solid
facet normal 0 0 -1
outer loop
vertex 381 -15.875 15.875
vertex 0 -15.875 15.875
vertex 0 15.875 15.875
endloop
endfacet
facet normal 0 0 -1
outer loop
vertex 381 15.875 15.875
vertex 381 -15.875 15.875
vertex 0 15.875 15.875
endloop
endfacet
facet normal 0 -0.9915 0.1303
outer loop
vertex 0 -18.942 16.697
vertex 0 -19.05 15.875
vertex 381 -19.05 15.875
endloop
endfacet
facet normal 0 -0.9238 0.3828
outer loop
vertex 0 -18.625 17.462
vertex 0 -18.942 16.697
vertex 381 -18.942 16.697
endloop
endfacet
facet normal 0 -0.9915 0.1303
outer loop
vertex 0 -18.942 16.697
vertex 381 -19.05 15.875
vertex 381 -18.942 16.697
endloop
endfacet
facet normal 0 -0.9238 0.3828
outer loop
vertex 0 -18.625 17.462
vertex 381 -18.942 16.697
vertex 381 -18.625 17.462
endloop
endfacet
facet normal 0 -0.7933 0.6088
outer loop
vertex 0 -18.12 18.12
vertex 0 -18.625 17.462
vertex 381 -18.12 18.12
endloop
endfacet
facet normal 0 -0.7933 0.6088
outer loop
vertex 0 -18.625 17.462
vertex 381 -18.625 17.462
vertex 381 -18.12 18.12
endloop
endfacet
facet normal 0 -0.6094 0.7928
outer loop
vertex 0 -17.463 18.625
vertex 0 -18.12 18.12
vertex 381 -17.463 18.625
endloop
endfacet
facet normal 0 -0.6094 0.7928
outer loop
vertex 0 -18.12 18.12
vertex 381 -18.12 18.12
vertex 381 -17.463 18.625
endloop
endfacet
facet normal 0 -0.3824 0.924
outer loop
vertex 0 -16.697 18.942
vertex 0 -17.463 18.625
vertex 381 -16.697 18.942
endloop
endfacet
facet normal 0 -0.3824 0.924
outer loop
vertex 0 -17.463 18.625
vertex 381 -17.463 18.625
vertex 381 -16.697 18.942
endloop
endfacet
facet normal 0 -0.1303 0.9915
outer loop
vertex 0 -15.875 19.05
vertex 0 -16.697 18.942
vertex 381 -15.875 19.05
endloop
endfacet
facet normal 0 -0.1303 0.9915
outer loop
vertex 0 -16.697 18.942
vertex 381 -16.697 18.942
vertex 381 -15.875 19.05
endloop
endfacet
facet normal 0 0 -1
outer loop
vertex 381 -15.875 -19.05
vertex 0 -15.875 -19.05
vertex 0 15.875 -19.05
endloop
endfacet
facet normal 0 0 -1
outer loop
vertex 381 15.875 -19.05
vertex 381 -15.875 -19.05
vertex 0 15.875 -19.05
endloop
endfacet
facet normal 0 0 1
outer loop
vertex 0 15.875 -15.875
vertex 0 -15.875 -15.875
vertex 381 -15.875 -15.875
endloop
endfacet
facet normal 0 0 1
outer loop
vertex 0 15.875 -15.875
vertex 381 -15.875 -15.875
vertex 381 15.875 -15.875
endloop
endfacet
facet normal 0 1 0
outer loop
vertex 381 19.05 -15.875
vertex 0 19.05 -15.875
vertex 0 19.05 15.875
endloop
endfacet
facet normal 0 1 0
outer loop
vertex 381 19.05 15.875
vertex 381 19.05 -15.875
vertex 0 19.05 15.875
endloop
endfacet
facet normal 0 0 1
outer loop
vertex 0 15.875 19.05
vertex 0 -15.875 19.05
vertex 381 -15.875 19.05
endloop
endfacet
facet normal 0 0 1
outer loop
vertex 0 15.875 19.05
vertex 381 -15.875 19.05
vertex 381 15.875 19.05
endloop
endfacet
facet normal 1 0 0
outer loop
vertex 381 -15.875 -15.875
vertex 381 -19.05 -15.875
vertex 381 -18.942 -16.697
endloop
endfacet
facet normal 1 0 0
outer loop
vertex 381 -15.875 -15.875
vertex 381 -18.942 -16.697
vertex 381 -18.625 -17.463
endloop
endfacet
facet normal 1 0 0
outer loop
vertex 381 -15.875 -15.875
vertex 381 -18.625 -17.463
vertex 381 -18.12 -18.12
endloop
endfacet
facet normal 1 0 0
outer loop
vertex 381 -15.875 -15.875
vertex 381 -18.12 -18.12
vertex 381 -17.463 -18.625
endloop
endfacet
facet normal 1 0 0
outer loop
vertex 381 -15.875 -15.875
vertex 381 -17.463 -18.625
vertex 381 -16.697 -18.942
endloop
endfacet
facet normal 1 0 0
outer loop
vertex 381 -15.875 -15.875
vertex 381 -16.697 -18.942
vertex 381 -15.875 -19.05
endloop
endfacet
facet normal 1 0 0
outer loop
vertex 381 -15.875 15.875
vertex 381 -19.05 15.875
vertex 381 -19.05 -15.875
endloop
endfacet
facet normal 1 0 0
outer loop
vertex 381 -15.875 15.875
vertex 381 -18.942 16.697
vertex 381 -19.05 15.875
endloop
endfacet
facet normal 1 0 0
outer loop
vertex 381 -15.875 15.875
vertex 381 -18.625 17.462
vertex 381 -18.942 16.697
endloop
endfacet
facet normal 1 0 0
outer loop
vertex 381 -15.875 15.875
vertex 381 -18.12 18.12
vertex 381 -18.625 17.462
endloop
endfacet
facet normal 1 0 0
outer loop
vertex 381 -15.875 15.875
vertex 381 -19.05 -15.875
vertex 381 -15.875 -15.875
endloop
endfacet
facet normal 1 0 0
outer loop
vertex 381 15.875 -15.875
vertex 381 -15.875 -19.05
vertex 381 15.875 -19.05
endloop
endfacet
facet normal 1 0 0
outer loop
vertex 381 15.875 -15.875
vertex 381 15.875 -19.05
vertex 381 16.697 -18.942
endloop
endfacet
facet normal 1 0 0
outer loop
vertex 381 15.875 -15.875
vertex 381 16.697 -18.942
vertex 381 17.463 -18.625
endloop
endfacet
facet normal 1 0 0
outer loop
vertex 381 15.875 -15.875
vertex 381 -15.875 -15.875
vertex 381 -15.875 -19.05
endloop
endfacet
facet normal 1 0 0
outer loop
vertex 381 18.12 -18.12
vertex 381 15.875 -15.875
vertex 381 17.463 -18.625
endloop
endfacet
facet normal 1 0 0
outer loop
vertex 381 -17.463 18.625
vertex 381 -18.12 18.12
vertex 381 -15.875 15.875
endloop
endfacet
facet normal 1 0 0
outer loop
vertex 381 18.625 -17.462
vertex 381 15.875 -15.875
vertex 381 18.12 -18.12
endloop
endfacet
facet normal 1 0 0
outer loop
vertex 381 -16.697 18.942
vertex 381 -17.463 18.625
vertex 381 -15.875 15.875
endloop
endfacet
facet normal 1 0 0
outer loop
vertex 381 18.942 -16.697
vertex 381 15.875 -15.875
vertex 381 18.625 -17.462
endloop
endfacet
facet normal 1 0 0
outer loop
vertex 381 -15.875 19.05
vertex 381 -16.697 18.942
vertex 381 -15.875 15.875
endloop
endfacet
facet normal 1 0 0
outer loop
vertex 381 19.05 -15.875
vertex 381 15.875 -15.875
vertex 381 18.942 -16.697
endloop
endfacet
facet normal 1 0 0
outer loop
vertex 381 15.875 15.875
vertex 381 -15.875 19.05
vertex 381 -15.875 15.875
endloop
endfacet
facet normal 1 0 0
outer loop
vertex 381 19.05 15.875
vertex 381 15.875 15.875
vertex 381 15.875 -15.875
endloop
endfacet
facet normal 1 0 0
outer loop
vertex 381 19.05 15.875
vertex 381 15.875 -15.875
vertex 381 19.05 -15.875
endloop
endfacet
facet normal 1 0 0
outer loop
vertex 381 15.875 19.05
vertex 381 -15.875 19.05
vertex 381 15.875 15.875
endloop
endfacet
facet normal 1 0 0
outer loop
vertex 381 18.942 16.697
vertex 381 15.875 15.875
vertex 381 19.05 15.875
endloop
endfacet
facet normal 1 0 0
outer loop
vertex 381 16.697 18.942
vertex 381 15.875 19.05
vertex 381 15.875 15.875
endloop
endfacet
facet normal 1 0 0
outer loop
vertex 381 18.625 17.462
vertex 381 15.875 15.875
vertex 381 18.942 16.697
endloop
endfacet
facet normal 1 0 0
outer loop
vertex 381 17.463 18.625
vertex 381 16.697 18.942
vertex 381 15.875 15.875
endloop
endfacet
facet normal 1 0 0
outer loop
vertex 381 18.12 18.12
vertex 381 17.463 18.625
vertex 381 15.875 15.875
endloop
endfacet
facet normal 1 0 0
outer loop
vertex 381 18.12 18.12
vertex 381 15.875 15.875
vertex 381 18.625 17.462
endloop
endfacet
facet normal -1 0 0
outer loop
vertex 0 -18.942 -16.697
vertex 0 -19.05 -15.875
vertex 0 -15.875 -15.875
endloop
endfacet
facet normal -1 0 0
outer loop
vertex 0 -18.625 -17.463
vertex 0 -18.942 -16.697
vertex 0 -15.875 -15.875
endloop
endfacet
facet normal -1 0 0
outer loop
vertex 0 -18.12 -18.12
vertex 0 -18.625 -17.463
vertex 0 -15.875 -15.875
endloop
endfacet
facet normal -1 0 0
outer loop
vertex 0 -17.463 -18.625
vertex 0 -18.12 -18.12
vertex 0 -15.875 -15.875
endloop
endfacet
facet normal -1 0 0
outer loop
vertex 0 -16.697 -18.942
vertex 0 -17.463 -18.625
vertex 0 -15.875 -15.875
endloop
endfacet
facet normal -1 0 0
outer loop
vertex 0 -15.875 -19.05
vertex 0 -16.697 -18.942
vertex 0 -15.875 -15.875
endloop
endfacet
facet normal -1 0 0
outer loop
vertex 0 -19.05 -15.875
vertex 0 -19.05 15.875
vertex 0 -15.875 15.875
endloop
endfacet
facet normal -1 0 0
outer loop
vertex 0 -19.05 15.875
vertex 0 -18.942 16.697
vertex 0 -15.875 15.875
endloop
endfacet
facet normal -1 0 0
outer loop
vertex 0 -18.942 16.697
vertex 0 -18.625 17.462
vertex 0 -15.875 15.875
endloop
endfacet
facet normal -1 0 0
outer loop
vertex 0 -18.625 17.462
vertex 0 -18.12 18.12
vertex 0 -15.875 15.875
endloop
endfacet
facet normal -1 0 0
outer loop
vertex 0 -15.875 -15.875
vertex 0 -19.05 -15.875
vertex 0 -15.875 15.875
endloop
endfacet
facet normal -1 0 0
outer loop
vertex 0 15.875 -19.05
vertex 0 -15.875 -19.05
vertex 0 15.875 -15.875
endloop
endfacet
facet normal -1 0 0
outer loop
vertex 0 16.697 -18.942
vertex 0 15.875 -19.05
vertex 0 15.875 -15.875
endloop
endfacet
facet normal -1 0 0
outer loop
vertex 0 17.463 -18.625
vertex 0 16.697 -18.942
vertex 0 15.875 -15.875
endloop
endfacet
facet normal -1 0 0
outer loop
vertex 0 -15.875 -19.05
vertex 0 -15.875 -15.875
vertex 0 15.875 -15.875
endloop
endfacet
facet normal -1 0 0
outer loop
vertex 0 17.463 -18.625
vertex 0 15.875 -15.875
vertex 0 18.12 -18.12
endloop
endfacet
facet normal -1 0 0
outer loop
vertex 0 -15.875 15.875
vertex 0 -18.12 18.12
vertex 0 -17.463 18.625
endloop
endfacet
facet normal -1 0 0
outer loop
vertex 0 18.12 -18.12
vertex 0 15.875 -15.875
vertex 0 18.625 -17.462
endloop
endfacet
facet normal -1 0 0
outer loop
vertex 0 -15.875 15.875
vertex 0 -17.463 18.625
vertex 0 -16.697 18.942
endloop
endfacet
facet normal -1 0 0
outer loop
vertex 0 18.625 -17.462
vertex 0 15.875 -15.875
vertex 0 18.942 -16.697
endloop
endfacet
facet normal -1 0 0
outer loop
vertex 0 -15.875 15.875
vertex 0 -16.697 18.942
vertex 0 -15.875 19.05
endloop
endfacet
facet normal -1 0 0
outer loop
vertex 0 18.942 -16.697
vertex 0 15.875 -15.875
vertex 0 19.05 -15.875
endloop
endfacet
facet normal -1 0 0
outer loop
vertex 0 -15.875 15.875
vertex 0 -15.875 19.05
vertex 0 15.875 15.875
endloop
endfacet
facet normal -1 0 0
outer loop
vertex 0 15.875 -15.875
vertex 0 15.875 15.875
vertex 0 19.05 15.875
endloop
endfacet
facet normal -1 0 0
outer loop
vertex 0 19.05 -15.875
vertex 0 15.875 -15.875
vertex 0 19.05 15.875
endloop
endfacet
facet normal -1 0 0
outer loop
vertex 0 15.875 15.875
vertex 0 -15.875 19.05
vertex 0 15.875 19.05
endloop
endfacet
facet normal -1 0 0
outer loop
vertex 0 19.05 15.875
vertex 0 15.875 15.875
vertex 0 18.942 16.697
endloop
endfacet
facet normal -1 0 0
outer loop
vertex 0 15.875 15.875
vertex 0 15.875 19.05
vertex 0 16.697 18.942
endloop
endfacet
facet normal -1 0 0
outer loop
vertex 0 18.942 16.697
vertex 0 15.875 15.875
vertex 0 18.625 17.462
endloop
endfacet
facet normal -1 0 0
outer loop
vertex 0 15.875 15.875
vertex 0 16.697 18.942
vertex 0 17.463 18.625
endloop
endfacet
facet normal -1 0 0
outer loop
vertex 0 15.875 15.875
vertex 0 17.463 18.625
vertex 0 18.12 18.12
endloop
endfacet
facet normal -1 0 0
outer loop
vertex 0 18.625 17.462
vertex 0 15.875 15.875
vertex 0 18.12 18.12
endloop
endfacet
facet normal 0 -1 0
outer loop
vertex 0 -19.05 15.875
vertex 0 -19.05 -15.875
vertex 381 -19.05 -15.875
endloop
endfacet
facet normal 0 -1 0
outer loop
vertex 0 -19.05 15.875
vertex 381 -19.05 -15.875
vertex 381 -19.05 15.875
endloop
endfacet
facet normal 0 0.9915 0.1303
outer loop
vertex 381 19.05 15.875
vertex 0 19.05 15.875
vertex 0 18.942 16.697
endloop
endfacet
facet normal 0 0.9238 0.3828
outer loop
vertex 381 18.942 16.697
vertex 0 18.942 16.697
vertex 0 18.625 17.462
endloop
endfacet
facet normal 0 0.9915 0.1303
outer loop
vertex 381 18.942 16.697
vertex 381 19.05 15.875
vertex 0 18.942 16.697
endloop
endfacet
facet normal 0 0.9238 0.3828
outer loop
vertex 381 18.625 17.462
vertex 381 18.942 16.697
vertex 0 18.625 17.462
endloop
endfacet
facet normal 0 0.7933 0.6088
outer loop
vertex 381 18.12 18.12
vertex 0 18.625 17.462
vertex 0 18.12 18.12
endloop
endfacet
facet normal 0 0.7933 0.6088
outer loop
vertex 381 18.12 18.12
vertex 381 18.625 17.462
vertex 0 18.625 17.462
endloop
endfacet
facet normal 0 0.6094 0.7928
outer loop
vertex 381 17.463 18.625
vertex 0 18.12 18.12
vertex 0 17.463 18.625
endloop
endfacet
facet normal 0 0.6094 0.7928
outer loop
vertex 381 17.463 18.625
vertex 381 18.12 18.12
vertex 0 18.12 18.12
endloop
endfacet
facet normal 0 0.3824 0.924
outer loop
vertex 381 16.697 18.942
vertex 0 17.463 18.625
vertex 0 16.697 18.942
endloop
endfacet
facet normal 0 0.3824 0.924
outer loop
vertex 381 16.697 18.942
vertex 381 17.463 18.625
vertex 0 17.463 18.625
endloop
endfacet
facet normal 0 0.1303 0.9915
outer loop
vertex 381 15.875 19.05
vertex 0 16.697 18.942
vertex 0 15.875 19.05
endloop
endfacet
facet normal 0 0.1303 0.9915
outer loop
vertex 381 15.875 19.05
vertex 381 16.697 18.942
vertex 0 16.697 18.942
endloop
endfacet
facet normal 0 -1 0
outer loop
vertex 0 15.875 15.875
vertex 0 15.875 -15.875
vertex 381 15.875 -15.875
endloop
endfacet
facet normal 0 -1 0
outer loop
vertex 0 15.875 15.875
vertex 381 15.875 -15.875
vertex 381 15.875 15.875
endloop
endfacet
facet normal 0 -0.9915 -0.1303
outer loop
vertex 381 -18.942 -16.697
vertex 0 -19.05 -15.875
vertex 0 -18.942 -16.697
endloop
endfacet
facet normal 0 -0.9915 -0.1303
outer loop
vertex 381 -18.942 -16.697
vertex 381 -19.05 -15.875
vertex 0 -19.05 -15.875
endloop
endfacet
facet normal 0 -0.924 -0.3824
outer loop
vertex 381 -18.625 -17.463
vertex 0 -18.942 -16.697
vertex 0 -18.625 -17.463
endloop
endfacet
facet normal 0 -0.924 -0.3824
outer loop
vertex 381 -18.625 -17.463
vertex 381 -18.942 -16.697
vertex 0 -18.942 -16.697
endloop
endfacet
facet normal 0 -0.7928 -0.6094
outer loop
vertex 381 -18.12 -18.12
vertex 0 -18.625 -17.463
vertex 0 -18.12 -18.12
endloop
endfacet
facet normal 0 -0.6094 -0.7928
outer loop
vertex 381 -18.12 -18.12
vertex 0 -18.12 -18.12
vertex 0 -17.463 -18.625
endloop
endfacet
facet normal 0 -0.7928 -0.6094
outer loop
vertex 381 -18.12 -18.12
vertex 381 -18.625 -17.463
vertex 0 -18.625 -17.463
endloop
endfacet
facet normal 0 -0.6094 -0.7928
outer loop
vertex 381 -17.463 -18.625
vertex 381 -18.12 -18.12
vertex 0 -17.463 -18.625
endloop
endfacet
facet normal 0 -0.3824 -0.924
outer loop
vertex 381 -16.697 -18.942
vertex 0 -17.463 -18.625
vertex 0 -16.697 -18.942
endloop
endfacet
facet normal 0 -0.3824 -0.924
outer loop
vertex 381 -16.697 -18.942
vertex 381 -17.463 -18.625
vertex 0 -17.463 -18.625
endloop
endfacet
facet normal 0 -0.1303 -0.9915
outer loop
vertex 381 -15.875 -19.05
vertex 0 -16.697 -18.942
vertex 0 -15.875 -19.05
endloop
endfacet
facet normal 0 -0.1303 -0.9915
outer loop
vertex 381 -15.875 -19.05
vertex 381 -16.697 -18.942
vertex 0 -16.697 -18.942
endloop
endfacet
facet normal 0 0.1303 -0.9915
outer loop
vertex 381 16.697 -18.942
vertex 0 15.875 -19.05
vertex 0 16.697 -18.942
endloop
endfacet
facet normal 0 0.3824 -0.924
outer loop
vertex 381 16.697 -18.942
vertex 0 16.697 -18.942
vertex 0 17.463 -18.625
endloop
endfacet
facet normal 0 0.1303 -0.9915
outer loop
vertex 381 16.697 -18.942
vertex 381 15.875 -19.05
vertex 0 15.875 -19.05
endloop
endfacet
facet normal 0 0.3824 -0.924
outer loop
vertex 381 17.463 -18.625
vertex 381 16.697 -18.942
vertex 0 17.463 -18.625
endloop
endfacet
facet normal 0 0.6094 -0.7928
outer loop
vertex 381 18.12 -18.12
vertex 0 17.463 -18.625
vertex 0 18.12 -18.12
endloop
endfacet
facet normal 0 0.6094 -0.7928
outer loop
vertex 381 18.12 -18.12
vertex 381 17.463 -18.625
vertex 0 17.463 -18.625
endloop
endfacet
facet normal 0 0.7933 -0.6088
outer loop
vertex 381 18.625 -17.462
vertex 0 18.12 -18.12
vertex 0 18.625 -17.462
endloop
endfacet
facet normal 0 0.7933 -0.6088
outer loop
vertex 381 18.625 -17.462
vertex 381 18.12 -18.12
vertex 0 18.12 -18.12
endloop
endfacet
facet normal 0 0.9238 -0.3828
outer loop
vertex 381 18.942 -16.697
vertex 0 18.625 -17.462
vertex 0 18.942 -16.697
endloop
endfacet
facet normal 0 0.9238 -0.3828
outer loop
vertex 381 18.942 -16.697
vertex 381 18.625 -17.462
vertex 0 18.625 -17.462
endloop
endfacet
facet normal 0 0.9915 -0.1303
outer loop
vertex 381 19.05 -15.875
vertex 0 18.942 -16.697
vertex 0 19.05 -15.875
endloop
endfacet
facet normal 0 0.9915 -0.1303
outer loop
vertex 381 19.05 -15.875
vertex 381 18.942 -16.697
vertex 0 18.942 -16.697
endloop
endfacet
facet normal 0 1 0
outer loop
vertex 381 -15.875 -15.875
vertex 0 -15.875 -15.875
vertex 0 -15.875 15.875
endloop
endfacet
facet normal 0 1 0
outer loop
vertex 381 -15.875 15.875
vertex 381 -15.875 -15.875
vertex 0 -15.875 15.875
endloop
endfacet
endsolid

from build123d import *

# Parameters (mm, degrees)
F0_W     = 38.1
F0_H     = 38.1
F1_DEPTH = 381
F2_T     = -3.175
F3_R     = 3.175


with BuildPart() as f1:
    # F0 (on Right) → F1 (new body)
    with BuildSketch(Plane.YZ):
        Rectangle(F0_W, F0_H)
    extrude(amount=F1_DEPTH)

    # F2
    f2_openings = [f1.faces().sort_by_distance(p)[0] for p in [
        (381, 0, 0),
        (0, 0, 0),
    ]]
    offset(amount=F2_T, openings=f2_openings)

    # F3
    f3_edges = [f1.edges().sort_by_distance(p)[0] for p in [
        (190.5, -19.05, 19.05),
        (190.5, 19.05, 19.05),
        (190.5, -19.05, -19.05),
        (190.5, 19.05, -19.05),
    ]]
    fillet(f3_edges, radius=F3_R)


solid = f1.part
